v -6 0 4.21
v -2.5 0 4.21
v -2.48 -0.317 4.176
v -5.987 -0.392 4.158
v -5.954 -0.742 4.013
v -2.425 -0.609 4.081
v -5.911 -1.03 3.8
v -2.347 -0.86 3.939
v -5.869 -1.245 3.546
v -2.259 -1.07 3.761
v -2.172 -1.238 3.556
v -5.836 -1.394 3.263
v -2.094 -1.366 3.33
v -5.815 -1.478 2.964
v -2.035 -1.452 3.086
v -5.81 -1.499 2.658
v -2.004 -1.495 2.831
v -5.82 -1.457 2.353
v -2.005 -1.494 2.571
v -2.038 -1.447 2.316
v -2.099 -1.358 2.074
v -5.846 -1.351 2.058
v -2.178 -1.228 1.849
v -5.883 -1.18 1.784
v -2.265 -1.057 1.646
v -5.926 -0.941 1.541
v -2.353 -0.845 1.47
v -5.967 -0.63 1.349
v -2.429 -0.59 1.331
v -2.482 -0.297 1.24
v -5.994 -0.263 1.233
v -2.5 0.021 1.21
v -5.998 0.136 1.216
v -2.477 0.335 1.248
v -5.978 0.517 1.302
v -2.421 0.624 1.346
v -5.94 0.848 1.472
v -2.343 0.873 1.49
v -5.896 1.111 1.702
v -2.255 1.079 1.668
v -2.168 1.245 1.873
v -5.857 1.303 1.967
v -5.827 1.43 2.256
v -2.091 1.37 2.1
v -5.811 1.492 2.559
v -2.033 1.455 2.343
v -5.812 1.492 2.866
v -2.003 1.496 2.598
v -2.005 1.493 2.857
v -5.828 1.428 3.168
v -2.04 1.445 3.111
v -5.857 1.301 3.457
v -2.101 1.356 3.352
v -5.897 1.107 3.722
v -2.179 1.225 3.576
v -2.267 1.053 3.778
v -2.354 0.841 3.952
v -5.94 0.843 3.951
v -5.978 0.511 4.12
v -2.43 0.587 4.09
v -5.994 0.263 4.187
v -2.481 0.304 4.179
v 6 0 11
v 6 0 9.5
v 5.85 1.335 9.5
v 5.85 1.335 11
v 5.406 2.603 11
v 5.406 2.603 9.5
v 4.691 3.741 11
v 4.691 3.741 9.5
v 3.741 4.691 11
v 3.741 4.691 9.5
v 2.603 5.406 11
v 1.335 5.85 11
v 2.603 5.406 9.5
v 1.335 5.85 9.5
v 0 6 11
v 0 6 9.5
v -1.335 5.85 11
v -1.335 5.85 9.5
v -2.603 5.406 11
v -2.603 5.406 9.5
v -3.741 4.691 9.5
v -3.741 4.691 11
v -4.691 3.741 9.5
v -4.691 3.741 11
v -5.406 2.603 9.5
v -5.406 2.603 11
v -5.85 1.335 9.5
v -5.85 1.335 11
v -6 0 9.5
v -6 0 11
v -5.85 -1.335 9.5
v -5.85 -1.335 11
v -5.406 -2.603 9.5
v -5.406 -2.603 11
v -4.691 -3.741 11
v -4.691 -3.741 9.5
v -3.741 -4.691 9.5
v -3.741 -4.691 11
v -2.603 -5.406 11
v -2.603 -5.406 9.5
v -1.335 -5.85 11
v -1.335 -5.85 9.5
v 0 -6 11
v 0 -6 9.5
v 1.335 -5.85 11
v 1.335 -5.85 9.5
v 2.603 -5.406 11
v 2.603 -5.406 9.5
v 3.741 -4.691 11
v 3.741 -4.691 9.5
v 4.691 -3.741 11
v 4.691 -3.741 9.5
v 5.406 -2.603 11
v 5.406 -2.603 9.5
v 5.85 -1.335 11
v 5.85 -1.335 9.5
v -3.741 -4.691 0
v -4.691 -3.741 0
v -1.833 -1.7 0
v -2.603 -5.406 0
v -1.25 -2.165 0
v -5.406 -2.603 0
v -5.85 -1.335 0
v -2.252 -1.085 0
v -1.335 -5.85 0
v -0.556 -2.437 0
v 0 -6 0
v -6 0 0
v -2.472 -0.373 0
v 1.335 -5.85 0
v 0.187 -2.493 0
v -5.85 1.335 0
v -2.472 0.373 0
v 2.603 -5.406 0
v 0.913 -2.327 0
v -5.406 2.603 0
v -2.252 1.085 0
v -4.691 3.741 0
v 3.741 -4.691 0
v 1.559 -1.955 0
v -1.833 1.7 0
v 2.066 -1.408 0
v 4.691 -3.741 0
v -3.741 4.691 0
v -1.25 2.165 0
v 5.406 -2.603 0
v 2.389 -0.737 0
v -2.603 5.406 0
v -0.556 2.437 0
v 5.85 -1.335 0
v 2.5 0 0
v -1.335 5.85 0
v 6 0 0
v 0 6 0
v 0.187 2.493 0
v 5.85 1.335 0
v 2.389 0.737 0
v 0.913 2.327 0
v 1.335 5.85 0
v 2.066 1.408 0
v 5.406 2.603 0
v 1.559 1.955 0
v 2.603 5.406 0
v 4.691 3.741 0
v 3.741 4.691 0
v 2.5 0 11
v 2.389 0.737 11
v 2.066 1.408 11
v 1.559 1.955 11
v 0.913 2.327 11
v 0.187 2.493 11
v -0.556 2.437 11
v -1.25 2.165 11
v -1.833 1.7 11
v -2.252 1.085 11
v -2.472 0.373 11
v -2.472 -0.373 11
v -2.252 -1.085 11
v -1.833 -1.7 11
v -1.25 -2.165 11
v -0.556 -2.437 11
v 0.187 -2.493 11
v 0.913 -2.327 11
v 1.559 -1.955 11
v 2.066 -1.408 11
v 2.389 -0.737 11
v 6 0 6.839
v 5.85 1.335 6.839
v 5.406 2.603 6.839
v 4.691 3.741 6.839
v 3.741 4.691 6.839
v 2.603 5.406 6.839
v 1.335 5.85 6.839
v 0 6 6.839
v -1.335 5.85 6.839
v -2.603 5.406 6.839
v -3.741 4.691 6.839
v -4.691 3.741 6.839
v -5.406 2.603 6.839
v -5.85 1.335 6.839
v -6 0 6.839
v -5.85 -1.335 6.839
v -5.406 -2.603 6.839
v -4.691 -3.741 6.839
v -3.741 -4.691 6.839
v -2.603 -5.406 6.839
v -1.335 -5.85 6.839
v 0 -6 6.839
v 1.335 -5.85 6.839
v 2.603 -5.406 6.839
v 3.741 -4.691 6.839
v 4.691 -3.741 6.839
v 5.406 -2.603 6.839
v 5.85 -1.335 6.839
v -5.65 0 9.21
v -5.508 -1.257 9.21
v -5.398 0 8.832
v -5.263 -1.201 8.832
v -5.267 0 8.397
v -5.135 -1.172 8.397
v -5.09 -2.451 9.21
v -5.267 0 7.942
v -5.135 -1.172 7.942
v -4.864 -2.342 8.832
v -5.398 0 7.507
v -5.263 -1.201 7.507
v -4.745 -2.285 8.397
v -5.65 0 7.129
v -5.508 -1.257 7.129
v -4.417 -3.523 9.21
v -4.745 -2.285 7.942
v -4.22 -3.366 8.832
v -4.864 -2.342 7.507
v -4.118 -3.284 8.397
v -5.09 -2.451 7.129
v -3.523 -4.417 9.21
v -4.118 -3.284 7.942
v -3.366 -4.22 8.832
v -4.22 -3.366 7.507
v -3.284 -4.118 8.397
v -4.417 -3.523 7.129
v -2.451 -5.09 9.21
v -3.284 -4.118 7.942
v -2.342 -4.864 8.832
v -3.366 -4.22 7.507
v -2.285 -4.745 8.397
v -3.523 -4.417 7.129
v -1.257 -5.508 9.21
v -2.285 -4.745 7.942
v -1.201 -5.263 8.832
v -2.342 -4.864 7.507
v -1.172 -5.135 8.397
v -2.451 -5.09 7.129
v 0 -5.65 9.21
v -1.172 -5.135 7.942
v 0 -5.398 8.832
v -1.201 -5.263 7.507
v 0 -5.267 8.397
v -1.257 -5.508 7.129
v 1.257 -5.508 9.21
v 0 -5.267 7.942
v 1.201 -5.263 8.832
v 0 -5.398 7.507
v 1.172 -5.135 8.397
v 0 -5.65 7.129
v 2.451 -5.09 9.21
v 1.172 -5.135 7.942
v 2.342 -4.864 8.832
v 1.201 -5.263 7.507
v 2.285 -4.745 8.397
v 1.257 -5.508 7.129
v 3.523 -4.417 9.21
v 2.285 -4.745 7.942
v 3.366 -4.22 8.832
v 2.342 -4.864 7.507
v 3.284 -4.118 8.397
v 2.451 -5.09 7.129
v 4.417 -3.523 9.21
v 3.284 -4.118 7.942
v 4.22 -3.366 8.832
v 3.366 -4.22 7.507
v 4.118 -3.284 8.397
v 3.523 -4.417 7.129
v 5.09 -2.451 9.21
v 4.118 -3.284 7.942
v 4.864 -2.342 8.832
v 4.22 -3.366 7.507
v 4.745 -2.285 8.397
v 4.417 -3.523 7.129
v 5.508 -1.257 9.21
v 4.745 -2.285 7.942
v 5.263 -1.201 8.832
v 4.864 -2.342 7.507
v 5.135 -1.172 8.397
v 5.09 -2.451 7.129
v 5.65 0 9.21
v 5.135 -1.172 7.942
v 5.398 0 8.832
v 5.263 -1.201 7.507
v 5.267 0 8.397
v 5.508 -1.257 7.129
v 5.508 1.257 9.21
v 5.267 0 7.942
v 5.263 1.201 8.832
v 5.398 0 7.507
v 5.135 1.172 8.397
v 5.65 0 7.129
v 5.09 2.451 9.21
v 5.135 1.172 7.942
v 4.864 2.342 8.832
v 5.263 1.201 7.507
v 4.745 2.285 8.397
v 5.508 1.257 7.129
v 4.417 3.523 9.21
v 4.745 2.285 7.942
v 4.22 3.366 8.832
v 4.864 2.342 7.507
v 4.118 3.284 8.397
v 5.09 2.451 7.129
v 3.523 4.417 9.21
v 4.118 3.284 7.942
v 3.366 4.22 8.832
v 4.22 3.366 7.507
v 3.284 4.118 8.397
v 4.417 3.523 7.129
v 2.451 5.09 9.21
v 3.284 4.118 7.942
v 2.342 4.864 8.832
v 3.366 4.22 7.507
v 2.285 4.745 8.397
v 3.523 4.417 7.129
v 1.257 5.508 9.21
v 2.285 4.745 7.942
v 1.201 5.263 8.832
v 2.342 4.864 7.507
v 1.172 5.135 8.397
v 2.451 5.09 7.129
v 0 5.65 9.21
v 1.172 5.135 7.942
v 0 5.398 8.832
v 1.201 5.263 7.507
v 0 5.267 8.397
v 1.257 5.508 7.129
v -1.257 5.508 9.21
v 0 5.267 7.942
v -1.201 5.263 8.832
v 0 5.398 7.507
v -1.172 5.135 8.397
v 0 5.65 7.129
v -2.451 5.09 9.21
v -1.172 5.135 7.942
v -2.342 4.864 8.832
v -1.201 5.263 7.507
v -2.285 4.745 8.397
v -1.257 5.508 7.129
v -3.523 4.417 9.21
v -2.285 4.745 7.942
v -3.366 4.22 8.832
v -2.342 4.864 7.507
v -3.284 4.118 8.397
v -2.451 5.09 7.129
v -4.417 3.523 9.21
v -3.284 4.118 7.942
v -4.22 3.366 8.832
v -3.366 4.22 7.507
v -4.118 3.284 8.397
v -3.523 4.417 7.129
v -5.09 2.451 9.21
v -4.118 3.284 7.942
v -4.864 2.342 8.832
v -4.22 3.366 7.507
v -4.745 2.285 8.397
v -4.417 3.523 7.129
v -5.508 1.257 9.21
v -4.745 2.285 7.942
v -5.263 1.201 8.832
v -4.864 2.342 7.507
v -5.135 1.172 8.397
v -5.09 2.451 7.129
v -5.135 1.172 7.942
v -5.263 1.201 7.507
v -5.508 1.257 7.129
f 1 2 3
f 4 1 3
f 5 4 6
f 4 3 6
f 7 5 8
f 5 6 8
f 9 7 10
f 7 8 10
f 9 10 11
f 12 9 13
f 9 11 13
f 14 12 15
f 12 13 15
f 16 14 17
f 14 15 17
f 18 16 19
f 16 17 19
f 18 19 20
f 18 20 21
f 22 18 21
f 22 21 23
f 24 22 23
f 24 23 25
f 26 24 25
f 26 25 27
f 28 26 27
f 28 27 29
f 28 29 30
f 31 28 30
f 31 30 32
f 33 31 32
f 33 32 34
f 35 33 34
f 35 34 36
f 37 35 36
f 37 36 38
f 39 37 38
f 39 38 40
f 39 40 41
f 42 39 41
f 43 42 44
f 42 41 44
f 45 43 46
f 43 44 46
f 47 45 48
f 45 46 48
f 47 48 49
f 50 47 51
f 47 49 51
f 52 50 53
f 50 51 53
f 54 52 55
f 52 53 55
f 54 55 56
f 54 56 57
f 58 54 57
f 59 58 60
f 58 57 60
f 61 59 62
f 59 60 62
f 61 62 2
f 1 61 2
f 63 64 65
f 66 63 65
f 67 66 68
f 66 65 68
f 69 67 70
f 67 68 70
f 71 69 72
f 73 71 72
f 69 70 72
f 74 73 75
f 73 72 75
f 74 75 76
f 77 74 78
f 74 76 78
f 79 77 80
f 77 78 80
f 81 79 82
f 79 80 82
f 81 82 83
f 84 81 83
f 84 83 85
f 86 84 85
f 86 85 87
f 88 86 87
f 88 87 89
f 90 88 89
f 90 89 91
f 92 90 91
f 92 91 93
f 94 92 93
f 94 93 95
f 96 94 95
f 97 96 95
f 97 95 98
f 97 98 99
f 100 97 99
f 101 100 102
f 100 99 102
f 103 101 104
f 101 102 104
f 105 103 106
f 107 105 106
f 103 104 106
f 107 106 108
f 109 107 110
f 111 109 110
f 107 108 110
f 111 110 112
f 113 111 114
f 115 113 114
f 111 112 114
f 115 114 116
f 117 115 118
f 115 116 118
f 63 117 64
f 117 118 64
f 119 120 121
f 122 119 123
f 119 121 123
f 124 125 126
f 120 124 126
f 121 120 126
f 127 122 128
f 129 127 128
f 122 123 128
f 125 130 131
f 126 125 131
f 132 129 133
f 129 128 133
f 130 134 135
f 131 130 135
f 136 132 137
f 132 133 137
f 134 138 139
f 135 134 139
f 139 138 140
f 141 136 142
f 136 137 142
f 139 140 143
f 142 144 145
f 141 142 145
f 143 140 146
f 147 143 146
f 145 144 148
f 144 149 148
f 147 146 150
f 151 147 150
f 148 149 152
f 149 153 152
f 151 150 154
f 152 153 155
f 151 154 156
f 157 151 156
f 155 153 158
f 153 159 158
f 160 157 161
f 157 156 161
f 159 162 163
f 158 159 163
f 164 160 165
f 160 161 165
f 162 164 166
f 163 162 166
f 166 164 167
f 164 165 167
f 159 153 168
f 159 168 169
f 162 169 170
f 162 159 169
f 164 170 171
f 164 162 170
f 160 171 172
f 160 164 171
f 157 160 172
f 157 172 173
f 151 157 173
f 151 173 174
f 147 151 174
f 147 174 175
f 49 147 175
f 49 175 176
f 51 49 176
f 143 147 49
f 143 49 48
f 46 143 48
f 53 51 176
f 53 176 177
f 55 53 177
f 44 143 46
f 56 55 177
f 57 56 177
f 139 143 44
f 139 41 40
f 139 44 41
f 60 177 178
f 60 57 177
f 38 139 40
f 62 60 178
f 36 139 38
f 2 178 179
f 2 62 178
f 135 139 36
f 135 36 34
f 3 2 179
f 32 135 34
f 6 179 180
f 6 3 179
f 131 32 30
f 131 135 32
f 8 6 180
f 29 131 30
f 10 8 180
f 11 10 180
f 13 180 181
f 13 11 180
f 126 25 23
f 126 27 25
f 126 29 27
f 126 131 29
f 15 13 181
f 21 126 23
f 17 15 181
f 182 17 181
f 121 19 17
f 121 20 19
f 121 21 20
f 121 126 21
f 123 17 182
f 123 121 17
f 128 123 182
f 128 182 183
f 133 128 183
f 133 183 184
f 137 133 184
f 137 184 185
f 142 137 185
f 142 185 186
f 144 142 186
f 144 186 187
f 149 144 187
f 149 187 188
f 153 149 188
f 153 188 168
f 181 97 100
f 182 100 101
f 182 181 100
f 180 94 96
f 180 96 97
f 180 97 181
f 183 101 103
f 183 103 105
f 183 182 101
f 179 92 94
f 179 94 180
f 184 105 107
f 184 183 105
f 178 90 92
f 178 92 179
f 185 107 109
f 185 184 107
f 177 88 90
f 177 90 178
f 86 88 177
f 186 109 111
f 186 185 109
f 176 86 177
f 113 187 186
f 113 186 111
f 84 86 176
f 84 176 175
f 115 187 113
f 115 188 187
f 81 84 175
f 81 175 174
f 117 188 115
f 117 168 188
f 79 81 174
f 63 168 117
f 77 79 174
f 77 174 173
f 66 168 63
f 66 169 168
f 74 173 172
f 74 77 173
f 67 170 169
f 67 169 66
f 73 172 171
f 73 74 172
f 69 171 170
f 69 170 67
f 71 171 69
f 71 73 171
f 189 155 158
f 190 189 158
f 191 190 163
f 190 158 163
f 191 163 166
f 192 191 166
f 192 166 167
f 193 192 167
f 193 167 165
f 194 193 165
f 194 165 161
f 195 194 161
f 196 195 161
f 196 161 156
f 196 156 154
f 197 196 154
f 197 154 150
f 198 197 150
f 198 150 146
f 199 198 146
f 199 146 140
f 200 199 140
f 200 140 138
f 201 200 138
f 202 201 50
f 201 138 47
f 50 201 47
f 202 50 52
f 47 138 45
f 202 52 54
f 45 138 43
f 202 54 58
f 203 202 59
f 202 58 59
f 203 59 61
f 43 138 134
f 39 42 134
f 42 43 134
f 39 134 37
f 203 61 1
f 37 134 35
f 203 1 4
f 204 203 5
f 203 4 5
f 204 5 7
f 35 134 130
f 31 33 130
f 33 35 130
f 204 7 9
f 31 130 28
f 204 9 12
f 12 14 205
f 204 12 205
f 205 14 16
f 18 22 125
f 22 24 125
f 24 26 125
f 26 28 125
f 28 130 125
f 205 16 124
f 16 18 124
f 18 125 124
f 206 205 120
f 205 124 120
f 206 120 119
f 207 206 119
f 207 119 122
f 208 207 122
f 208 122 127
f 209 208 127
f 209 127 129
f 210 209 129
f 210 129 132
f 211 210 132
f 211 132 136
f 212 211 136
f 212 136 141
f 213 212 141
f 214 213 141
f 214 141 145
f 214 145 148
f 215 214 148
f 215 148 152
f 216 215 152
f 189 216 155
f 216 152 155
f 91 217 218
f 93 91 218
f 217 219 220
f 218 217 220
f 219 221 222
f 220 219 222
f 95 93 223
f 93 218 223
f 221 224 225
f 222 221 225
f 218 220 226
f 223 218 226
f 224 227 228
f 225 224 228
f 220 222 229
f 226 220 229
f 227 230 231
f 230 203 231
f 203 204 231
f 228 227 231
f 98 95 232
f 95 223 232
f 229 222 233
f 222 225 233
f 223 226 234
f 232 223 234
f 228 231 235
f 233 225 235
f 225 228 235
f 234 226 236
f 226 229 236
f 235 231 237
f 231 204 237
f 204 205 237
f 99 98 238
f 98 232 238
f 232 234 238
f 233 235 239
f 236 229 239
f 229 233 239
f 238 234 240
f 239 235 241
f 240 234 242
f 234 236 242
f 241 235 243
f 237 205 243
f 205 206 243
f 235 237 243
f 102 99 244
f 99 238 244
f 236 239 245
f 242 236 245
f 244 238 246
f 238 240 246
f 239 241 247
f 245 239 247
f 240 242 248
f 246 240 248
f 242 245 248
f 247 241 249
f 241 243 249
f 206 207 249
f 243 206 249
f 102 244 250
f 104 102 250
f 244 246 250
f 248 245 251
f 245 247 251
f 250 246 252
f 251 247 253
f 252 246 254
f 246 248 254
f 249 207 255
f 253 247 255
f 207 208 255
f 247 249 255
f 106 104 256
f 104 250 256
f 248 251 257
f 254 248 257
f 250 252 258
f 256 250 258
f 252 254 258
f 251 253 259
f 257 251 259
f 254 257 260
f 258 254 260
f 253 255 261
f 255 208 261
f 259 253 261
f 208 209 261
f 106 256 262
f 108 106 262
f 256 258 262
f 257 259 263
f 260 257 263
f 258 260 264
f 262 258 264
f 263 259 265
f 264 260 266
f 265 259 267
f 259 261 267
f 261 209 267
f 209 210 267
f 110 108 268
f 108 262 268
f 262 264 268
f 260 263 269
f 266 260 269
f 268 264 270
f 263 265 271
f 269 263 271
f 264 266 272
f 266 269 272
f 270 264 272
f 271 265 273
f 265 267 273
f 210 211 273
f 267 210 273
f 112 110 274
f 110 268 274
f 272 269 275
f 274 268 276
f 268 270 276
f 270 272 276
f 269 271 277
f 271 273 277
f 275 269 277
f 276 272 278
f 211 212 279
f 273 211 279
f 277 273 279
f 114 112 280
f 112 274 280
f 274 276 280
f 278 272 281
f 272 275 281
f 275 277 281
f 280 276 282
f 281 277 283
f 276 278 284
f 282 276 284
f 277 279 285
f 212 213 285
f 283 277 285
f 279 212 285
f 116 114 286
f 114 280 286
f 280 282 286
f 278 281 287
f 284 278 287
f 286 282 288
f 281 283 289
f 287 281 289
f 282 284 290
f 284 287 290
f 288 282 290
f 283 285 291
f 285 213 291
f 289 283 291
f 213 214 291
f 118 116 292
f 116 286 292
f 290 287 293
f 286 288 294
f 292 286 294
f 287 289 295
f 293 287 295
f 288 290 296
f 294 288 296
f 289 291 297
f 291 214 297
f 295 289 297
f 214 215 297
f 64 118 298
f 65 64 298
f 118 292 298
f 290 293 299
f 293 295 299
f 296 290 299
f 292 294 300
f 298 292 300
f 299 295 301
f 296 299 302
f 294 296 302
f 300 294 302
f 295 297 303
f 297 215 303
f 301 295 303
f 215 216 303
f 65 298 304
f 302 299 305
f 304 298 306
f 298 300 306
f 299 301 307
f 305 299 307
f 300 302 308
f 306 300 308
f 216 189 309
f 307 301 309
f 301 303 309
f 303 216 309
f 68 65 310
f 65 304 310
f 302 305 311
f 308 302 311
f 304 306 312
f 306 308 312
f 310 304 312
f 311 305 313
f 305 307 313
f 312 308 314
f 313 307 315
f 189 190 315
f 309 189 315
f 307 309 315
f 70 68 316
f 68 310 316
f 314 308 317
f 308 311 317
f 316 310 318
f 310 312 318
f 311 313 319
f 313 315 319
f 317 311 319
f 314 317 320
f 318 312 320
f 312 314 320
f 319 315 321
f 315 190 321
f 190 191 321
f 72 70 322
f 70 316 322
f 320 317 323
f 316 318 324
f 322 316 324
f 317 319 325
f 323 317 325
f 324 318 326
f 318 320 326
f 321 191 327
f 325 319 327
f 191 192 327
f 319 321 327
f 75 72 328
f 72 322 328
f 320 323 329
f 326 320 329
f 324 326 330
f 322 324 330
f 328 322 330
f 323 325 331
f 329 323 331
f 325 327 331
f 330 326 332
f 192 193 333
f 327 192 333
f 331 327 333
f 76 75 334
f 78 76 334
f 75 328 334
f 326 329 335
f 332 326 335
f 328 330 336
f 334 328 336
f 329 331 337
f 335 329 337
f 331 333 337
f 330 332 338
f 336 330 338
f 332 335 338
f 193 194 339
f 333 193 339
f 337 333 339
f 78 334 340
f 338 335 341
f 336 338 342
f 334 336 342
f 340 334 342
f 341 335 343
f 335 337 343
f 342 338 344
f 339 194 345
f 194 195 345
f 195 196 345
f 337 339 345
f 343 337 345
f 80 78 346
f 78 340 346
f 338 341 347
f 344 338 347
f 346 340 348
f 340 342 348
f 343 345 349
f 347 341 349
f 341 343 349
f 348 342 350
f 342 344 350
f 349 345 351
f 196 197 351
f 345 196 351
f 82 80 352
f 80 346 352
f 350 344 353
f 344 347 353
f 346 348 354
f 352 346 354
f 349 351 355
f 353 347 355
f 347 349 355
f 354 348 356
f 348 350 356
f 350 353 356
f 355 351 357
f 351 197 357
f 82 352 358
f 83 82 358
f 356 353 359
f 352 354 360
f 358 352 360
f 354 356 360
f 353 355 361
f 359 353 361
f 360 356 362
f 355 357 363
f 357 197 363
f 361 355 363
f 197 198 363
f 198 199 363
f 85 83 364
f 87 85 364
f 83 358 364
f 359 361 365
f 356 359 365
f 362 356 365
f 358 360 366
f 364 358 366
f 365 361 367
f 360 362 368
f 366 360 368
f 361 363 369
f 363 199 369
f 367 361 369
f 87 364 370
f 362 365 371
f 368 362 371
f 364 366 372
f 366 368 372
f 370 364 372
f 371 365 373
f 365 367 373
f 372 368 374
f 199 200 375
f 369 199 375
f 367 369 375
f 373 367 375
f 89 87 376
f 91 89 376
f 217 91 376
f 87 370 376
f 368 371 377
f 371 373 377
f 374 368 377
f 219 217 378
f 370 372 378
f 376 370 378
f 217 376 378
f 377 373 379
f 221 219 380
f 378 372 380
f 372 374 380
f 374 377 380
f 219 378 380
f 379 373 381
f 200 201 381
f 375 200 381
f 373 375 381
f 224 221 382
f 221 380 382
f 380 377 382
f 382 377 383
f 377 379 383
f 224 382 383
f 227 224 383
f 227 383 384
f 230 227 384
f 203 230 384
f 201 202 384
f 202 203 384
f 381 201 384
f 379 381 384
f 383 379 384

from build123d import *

# Parameters (mm, degrees)
SKICA1_R                 = 6
SKICA1_R_2               = 2.5
P_IDAT_VYSUNUT_M1_DEPTH  = 11
SKICA3_R                 = 1.5
ODEBRAT_VYSUNUT_M1_DEPTH = 11


with BuildPart() as part:
    # Skica1 → Přidat vysunutím1 (new body)
    with BuildSketch(Plane.XY):
        Circle(SKICA1_R)
        Circle(SKICA1_R_2, mode=Mode.SUBTRACT)
    extrude(amount=P_IDAT_VYSUNUT_M1_DEPTH)

    # Skica2 → Odebrat rotací1 (revolve, cut)
    with BuildSketch(Plane(origin=(0, 0, 0), x_dir=(0, 0, -1), z_dir=(1, 0, 0)), mode=Mode.PRIVATE) as odebrat_rotac_1_sk:
        with BuildLine():
            Line((-6.838910778, 6), (-9.5, 6))
            ThreePointArc((-9.5, 6), (-8.169455389, 5.25), (-6.838910778, 6))
        make_face()
    revolve(odebrat_rotac_1_sk.sketch.rotate(Axis((0, 0, 0), (0, 0, 1)), 90), axis=Axis((0, 0, 0), (0, 0, 1)), mode=Mode.SUBTRACT)

    # Skica3 → Odebrat vysunutím1 (cut)
    with BuildSketch(Plane(origin=(0, 0, 0), x_dir=(0, 0, -1), z_dir=(1, 0, 0))):
        with Locations(Location((-2.709871991, 0, 0), (0, 0, 180))):
            Circle(SKICA3_R)
    extrude(amount=-ODEBRAT_VYSUNUT_M1_DEPTH, mode=Mode.SUBTRACT)


solid = part.part
